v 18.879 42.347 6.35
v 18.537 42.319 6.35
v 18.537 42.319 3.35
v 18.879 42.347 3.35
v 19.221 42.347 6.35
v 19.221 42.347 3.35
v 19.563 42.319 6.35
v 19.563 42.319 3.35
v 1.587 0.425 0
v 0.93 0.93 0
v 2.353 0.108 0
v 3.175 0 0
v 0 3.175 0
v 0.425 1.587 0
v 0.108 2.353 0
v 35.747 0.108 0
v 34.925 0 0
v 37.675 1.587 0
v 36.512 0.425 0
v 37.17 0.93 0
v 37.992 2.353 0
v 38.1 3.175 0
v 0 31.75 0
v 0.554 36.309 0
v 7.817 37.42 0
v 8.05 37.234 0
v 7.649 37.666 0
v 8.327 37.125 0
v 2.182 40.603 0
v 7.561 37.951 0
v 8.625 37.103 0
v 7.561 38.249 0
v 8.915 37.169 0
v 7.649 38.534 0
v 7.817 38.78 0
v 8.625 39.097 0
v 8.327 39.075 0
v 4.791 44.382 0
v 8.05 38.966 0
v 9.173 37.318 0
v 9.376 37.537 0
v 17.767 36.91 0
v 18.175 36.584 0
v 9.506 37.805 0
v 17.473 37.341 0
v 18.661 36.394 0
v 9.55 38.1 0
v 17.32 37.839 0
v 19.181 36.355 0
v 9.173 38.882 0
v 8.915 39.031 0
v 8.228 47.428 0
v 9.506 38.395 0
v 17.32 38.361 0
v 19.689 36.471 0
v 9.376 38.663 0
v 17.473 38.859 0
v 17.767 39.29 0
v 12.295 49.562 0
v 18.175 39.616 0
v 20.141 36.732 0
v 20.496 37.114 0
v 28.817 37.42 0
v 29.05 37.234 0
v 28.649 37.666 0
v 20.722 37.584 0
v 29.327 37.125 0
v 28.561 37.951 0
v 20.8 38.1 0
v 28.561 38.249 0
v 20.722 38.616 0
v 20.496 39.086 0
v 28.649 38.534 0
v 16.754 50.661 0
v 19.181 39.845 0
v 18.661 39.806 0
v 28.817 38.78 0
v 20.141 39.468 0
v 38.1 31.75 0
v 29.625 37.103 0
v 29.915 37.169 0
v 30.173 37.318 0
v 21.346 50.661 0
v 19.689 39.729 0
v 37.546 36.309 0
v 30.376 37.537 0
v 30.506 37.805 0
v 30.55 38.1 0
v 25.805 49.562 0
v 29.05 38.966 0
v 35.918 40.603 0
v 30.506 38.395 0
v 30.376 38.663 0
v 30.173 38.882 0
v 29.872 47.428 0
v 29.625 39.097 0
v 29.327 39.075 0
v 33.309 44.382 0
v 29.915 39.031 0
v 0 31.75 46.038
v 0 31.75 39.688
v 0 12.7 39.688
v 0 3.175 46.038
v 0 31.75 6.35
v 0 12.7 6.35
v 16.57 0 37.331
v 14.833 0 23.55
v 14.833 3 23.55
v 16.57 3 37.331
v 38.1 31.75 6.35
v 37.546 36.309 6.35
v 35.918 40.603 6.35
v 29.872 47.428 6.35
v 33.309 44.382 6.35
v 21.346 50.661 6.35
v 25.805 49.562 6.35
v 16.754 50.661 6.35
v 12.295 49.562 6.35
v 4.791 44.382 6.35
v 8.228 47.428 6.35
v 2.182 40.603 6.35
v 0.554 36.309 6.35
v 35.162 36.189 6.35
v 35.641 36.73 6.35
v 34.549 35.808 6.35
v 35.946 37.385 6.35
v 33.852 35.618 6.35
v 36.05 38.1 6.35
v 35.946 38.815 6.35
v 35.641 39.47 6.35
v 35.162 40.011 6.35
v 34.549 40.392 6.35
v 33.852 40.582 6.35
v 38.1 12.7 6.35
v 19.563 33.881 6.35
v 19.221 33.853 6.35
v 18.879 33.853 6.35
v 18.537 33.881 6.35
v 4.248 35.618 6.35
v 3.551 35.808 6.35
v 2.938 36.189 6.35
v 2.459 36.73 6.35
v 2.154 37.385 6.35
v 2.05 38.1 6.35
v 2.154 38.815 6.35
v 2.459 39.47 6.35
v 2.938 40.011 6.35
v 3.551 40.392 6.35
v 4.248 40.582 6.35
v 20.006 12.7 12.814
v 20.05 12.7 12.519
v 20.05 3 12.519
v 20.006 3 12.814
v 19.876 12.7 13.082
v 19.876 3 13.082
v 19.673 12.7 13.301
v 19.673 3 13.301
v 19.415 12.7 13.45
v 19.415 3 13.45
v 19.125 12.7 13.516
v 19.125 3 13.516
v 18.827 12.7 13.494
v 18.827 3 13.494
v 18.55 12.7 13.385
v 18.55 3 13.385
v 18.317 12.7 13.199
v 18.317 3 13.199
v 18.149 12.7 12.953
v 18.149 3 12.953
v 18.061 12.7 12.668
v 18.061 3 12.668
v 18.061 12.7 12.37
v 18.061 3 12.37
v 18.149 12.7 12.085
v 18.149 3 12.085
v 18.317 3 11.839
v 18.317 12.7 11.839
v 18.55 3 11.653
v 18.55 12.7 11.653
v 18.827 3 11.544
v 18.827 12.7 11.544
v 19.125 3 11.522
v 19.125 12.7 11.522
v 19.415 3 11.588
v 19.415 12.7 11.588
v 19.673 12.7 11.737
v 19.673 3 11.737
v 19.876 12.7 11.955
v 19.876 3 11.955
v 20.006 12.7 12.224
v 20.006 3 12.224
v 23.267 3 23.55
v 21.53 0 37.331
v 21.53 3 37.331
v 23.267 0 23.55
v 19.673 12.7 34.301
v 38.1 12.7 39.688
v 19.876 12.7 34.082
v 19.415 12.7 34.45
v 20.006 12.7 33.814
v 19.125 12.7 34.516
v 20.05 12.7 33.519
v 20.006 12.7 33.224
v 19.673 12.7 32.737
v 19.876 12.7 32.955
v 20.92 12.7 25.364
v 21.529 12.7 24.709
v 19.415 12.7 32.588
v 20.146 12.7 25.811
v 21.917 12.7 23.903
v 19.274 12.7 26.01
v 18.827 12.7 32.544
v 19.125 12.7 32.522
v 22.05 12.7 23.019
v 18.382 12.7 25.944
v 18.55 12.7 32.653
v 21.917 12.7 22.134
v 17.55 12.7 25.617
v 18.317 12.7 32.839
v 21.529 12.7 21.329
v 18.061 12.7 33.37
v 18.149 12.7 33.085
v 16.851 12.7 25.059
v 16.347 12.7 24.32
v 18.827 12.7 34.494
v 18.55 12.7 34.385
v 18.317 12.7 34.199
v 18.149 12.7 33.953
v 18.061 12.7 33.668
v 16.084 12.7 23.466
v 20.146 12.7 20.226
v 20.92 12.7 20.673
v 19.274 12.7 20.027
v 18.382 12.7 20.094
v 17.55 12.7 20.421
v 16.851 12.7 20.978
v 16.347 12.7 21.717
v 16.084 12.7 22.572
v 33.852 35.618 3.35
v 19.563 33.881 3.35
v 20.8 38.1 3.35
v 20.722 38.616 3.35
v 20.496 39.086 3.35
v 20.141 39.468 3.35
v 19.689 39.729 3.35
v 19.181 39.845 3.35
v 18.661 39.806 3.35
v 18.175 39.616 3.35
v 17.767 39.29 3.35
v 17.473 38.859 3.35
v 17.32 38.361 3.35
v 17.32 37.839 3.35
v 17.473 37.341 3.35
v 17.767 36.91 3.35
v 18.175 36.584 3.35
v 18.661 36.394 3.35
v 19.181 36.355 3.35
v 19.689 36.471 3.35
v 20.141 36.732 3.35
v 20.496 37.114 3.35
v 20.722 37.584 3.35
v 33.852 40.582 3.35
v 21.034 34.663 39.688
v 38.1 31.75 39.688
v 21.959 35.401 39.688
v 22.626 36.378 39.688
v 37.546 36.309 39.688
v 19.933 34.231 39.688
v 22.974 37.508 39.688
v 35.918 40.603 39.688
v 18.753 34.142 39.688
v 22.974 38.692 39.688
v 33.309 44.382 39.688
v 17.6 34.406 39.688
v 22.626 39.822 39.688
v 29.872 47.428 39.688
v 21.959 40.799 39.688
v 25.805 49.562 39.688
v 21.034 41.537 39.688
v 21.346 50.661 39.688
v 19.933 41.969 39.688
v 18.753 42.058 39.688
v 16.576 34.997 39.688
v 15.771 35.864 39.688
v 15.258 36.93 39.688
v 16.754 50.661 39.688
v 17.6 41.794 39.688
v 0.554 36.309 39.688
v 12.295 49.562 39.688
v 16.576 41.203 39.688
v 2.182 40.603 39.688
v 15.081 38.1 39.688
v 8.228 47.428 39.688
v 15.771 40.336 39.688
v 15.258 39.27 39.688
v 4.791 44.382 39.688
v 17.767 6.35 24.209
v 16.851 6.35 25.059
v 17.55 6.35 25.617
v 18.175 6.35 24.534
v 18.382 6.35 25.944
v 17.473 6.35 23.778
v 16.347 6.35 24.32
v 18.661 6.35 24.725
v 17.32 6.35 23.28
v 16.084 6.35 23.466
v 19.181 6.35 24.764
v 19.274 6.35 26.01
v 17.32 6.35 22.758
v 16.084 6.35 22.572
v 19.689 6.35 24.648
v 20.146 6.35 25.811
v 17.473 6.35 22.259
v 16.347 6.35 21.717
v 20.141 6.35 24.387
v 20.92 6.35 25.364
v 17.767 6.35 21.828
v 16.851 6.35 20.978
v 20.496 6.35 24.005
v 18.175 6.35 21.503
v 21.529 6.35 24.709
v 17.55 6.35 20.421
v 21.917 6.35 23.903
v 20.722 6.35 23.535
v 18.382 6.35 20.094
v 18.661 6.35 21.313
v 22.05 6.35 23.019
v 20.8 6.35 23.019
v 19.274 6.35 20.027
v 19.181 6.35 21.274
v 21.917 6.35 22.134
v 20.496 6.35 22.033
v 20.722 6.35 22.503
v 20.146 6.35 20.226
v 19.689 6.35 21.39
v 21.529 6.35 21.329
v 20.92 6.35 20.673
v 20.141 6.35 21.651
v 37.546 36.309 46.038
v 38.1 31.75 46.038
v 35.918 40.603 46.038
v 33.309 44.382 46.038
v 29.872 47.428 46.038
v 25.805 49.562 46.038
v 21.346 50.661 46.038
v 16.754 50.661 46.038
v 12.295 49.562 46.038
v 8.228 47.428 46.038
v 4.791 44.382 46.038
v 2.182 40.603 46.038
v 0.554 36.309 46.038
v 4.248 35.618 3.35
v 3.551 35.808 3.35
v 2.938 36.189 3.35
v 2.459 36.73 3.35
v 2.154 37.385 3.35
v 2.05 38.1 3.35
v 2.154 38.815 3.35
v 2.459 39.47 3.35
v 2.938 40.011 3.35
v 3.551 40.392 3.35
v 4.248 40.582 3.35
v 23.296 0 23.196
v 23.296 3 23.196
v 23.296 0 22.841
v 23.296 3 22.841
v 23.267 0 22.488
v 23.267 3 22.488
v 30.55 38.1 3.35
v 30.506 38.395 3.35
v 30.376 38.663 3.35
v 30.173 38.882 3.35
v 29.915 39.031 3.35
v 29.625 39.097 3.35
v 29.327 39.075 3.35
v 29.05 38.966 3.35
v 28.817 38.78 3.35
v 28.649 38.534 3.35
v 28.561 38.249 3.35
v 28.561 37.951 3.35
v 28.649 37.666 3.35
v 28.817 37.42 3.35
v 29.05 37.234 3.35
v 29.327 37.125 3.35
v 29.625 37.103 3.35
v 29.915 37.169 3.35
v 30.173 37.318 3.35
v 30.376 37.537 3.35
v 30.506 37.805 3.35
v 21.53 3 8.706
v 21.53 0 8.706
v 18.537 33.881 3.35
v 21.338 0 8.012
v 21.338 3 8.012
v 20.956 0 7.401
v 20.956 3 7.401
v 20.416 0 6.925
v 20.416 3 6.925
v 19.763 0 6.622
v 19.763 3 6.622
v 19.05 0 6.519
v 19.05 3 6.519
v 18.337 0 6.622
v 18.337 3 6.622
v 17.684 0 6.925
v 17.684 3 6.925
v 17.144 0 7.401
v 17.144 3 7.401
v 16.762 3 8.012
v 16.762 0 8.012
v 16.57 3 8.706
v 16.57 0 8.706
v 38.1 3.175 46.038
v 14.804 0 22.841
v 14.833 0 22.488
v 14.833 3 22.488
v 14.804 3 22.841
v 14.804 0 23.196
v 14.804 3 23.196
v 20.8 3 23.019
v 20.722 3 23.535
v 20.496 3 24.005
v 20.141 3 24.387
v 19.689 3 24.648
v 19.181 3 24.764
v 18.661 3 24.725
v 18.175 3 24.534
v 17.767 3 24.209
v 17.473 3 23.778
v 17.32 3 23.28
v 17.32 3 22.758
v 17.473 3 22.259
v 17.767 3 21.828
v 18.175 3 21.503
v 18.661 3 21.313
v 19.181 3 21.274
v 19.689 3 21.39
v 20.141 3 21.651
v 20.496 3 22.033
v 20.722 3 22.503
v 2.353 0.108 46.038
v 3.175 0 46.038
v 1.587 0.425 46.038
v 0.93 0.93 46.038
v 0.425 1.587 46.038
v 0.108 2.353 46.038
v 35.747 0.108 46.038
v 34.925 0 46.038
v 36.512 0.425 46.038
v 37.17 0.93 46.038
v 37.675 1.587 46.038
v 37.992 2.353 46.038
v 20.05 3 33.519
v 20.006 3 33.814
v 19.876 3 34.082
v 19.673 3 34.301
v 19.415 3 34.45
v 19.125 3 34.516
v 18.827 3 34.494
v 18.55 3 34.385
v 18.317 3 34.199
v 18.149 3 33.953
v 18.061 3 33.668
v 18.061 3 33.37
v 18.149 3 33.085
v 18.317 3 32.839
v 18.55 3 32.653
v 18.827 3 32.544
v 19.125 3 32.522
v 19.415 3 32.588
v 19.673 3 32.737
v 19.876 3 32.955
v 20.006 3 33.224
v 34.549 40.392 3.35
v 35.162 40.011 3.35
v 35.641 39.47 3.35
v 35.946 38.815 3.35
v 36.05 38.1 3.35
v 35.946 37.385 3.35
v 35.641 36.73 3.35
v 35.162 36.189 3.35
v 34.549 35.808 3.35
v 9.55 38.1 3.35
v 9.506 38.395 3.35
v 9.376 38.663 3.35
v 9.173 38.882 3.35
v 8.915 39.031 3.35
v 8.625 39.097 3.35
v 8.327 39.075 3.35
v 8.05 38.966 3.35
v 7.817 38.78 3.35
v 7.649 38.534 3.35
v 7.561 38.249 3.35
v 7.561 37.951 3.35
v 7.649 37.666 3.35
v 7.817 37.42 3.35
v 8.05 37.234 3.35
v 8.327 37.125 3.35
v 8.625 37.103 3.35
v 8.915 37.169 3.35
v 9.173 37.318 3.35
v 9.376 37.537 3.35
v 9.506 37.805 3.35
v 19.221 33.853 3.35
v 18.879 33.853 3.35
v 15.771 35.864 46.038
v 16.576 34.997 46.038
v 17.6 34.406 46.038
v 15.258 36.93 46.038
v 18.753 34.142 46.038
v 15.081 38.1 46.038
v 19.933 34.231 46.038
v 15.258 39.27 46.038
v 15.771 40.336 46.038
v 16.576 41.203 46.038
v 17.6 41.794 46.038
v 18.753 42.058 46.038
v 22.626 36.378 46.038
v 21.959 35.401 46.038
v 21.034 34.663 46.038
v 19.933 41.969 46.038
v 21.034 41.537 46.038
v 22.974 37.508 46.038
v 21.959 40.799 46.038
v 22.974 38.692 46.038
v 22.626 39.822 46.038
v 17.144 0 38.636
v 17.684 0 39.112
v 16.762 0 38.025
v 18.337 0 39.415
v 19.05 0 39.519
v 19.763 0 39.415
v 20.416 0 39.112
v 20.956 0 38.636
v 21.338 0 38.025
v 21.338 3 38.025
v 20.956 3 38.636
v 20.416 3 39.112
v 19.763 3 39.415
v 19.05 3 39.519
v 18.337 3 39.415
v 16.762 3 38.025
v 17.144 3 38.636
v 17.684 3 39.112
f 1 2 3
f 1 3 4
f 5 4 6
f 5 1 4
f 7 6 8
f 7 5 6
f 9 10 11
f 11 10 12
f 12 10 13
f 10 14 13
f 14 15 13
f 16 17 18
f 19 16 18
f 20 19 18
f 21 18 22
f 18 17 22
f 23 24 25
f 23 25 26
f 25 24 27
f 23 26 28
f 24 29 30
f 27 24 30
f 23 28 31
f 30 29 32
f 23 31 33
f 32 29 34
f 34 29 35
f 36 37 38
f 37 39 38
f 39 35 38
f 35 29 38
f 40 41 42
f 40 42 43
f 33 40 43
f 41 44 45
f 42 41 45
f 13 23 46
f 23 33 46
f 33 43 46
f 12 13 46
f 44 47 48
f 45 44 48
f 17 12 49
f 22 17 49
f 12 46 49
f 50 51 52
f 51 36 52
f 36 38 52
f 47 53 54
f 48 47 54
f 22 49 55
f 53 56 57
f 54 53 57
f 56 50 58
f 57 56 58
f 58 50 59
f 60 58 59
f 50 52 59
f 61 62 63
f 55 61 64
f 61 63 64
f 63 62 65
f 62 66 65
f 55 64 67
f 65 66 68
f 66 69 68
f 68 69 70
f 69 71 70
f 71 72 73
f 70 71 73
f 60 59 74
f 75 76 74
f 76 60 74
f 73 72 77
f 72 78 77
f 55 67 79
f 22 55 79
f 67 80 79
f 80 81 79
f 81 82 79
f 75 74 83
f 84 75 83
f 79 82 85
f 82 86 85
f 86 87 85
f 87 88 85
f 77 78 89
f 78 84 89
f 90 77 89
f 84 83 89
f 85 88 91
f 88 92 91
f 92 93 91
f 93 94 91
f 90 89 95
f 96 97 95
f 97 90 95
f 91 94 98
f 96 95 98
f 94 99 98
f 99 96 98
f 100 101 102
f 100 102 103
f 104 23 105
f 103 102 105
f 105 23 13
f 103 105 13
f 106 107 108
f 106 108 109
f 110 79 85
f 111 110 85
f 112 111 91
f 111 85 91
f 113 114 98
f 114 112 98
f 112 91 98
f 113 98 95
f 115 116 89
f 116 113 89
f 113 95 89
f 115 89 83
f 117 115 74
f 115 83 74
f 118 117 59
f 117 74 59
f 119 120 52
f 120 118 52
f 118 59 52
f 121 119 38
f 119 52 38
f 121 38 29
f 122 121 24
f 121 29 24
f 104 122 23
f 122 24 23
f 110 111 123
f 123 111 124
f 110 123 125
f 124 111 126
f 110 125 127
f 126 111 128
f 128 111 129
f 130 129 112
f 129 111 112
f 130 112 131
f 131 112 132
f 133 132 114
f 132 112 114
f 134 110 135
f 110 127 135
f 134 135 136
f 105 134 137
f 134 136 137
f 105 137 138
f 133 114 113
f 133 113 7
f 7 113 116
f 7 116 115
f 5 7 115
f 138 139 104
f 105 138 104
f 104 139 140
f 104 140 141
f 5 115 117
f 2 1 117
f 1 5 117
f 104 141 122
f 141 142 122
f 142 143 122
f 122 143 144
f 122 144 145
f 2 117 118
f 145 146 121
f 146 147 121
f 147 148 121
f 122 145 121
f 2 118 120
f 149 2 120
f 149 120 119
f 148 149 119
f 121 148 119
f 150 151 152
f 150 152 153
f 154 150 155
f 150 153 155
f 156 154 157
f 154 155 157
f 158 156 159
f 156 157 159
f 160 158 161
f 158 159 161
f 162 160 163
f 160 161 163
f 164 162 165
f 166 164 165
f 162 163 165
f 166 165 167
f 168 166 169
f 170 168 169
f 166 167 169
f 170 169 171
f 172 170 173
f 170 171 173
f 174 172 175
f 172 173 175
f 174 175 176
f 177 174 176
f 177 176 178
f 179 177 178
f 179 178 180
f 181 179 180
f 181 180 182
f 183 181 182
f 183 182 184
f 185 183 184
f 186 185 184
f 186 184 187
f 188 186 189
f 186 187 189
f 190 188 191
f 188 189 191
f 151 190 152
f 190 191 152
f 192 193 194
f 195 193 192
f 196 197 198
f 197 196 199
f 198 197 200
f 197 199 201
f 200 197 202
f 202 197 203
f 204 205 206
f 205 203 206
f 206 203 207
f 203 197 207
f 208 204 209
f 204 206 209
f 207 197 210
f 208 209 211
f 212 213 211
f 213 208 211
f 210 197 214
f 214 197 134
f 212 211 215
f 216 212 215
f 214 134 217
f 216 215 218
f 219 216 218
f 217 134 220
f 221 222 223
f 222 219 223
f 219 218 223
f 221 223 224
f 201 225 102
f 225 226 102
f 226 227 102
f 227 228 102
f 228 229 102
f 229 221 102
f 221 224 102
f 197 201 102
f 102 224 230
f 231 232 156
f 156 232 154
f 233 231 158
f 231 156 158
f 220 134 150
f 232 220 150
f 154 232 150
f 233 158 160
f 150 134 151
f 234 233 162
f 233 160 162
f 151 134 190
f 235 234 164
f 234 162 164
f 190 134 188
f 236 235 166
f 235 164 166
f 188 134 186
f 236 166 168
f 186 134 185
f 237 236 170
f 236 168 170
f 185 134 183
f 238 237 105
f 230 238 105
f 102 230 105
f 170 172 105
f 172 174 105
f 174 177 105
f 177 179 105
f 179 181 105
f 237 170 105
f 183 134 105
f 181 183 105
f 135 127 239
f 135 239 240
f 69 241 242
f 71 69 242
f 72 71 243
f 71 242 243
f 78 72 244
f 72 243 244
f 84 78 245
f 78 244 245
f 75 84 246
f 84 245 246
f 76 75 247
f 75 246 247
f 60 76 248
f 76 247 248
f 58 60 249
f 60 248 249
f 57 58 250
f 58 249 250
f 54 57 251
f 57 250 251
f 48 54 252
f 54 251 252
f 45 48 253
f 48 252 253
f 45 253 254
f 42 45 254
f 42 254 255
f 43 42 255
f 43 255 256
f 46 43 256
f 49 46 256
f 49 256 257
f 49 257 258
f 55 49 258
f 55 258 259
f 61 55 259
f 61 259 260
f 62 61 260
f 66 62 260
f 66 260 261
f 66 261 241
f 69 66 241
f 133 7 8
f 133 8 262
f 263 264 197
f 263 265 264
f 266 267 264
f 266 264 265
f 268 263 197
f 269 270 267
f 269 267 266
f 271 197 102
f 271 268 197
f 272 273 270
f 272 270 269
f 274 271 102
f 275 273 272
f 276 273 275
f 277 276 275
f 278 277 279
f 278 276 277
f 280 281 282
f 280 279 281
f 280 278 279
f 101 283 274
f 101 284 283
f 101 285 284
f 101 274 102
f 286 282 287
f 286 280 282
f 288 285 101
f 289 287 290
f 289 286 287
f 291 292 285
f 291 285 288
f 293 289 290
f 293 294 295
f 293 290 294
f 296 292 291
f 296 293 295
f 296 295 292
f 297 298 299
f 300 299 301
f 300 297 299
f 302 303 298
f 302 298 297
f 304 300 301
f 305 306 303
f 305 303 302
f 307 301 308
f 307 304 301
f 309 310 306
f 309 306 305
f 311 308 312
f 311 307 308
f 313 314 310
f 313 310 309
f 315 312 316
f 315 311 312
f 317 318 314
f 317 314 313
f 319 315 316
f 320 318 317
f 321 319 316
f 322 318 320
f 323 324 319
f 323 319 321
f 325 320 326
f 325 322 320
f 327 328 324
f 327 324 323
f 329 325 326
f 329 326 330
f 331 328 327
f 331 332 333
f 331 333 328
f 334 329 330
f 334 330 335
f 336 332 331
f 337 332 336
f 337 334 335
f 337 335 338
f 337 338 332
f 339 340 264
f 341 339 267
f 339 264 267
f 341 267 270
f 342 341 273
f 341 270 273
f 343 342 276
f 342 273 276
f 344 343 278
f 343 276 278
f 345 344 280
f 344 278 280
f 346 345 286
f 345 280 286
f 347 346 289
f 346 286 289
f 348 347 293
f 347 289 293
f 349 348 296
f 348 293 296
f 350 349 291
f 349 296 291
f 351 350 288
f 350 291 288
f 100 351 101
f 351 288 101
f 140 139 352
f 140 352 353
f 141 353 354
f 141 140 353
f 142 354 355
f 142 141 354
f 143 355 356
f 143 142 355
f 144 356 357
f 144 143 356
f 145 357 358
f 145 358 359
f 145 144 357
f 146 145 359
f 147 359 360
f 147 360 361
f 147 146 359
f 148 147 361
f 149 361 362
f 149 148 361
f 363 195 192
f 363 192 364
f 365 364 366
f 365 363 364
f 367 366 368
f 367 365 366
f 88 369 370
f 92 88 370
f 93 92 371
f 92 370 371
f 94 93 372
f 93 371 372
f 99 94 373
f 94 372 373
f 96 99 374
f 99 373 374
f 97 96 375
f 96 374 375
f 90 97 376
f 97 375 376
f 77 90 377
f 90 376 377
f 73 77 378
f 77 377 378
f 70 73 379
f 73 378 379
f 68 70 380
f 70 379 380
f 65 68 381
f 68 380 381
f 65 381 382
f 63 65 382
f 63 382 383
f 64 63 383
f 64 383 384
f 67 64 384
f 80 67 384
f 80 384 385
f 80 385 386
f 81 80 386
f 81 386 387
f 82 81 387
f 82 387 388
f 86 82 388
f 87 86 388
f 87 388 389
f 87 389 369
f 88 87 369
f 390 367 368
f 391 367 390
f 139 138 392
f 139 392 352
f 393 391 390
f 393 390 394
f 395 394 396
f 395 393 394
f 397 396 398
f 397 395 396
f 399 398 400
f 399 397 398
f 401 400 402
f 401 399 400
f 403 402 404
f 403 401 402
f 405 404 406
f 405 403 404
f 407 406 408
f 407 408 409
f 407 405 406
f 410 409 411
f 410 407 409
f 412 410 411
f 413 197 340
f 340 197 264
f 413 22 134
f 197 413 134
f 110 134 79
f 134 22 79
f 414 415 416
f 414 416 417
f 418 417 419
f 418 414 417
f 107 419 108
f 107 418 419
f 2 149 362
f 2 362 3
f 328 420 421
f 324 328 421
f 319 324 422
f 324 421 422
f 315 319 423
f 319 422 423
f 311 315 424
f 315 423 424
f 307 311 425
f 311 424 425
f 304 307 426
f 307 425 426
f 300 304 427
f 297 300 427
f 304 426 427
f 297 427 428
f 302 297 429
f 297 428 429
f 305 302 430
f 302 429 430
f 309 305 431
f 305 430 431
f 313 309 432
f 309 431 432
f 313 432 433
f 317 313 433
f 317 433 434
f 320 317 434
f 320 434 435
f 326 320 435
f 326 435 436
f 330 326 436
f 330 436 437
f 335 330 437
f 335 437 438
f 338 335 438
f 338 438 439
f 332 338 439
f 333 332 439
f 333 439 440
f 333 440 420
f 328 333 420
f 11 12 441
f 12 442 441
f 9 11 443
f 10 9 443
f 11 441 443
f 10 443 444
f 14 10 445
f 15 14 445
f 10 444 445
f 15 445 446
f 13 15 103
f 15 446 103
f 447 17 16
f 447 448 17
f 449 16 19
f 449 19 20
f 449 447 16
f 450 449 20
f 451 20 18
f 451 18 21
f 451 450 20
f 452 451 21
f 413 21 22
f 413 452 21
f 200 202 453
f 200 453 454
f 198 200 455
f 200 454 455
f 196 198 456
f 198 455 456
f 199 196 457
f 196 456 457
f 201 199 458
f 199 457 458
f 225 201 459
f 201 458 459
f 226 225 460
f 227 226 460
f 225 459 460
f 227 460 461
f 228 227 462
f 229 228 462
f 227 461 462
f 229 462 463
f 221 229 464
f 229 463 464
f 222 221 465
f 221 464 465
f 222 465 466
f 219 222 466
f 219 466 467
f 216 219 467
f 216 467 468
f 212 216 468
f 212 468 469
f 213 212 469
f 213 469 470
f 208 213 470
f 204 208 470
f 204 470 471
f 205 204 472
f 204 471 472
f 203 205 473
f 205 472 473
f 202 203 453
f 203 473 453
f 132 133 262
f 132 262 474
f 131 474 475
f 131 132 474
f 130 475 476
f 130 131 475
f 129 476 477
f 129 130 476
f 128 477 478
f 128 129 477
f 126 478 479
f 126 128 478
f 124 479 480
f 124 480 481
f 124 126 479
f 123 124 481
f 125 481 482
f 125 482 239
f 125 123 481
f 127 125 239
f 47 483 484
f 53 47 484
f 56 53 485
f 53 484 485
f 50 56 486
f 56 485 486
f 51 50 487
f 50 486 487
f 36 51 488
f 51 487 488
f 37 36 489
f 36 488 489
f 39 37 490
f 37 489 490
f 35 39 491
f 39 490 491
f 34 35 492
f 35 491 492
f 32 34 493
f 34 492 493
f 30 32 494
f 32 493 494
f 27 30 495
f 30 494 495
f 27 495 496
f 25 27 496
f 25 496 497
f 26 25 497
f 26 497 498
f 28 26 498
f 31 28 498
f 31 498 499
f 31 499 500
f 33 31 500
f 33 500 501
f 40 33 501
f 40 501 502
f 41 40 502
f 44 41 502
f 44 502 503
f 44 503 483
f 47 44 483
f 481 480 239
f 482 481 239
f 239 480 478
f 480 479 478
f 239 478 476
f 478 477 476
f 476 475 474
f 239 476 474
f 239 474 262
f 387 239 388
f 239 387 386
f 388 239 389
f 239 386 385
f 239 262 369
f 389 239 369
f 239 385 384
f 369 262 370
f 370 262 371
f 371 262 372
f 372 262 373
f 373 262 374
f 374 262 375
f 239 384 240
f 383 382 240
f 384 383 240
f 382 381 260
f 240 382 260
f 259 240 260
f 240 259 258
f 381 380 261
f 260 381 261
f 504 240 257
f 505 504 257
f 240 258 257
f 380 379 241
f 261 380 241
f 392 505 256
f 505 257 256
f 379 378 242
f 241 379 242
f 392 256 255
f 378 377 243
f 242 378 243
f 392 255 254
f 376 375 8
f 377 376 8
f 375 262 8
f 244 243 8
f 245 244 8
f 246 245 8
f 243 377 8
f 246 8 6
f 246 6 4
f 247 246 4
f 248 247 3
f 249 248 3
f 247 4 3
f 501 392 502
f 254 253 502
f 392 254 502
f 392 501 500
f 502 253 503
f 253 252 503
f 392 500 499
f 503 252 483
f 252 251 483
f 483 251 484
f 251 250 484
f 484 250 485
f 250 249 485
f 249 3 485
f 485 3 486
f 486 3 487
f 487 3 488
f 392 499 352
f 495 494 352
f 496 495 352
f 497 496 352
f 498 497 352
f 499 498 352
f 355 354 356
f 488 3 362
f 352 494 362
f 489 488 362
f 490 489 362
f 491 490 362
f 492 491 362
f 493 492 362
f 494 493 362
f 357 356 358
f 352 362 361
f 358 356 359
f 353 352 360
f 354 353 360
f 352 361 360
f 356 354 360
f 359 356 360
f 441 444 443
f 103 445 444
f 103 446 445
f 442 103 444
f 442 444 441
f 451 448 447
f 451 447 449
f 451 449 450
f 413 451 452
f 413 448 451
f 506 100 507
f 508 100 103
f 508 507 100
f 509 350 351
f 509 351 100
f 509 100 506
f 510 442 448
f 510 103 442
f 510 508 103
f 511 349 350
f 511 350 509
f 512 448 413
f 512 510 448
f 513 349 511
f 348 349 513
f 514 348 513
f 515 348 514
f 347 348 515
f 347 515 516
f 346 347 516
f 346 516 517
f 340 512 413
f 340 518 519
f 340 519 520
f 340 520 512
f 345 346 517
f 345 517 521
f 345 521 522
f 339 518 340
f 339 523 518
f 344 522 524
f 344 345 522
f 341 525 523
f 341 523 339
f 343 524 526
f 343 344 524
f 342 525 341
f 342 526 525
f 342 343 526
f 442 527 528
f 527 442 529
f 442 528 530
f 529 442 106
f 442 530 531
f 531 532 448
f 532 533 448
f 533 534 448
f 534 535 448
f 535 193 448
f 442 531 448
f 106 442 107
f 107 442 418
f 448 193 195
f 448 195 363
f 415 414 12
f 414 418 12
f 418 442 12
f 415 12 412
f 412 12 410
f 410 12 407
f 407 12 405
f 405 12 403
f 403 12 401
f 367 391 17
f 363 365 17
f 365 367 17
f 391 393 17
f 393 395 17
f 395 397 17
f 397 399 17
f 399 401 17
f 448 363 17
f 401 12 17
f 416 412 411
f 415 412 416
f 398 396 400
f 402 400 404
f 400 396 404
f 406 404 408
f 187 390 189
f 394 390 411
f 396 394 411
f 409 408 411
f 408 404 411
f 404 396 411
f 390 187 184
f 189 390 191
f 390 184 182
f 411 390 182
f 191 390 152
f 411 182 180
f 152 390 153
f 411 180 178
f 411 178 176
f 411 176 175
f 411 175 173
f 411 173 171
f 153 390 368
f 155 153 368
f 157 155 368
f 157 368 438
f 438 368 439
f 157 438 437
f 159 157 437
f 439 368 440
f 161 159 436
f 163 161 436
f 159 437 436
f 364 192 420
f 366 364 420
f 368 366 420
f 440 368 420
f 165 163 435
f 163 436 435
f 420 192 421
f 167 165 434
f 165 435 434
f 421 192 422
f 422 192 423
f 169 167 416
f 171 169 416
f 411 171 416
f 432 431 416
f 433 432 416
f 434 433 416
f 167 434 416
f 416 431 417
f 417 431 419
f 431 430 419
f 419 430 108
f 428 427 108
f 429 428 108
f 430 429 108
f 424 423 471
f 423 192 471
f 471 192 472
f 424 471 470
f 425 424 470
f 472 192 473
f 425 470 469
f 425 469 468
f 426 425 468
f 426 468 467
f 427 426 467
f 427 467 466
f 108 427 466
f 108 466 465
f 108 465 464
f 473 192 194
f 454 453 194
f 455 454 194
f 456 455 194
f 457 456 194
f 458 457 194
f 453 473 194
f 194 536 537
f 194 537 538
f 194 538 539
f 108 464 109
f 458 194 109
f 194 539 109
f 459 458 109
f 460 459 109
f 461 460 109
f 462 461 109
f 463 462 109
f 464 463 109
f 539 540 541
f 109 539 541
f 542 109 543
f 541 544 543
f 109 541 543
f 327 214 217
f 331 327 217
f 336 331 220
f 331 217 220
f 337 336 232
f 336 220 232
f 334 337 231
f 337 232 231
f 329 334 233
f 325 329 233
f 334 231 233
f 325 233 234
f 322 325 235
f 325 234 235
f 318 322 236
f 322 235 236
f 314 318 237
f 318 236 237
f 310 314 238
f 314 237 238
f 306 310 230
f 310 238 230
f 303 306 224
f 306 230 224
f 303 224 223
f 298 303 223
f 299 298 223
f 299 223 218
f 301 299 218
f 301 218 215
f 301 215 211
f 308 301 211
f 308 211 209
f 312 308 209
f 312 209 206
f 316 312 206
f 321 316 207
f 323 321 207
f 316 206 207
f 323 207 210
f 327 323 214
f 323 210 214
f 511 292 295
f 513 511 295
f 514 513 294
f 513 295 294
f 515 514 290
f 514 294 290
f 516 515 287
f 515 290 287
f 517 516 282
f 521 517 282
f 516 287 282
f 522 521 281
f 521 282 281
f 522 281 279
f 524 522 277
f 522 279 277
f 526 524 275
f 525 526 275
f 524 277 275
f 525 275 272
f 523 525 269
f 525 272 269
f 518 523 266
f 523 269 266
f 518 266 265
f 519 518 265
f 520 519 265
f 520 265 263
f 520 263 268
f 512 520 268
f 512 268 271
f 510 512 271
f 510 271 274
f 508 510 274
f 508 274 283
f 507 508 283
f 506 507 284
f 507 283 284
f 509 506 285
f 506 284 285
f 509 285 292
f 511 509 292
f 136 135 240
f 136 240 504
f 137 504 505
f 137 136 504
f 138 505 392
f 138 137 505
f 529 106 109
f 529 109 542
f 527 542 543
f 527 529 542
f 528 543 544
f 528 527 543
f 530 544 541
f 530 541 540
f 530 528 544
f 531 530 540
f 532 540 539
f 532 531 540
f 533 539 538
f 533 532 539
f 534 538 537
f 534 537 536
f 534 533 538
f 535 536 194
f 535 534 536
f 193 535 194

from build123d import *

# Parameters (mm, degrees)
BOSS_EXTRUDE1_DEPTH = 46.0375
FILLET1_R           = 3.175
CUT_EXTRUDE1_DEPTH  = 16.66875
SKETCH3_R           = 0.999998
SKETCH3_R_2         = 1.75
CUT_EXTRUDE2_DEPTH  = 6.35
SKETCH4_R           = 3.96875
CUT_EXTRUDE3_DEPTH  = 6.35
CUT_EXTRUDE4_DEPTH  = 3
SKETCH6_R           = 1.75
SKETCH6_R_2         = 1
CUT_EXTRUDE5_DEPTH  = 9.7
SKETCH7_R           = 3
CUT_EXTRUDE6_DEPTH  = 6.35
SKETCH9_R           = 0.999998
SKETCH9_R_2         = 1.75
CUT_EXTRUDE7_DEPTH  = 3


with BuildPart() as part:
    # Sketch1 → Boss-Extrude1 (new body)
    with BuildSketch(Plane.XY):
        with BuildLine():
            Line((0, 0), (38.1, 0))
            Line((38.1, 0), (38.1, 31.75))
            ThreePointArc((38.1, 31.75), (19.05, 50.8), (0, 31.75))
            Line((0, 31.75), (0, 0))
        make_face()
    extrude(amount=BOSS_EXTRUDE1_DEPTH)

    # Fillet1
    fillet1_edges = [part.edges().sort_by_distance(p)[0] for p in [
        (38.1, 0, 23.01875),
        (0, 0, 23.01875),
    ]]
    fillet(fillet1_edges, radius=FILLET1_R)

    # Sketch2 → Cut-Extrude1 (cut, symmetric)
    with BuildSketch(Plane(origin=(0, 0, 23.01875), x_dir=(-1, 0, 0), z_dir=(0, 0, -1))):
        with BuildLine():
            Line((-38.1, 31.75), (-38.1, 12.7))
            Line((-38.1, 12.7), (0, 12.7))
            Line((0, 12.7), (0, 31.75))
            ThreePointArc((0, 31.75), (-19.05, 50.8), (-38.1, 31.75))
        make_face()
    extrude(amount=CUT_EXTRUDE1_DEPTH, both=True, mode=Mode.SUBTRACT)

    # Sketch3 → Cut-Extrude2 (cut)
    with BuildSketch(Plane.XY.offset(6.35)):
        with Locations((8.55, 38.1)):
            Circle(SKETCH3_R)
        with Locations((29.55, 38.1)):
            Circle(SKETCH3_R)
        with Locations((19.05, 38.1)):
            Circle(SKETCH3_R_2)
    extrude(amount=-CUT_EXTRUDE2_DEPTH, mode=Mode.SUBTRACT)

    # Sketch4 → Cut-Extrude3 (cut)
    with BuildSketch(Plane(origin=(0, 0, 39.6875), x_dir=(-1, 0, 0), z_dir=(0, 0, -1))):
        with Locations((-19.05, 38.1)):
            Circle(SKETCH4_R)
    extrude(amount=-CUT_EXTRUDE3_DEPTH, mode=Mode.SUBTRACT)

    # Sketch5 → Cut-Extrude4 (cut)
    with BuildSketch(Plane.XZ):
        with BuildLine():
            Line((23.266666152, 22.4875), (21.530391854, 8.70625))
            ThreePointArc((21.530391854, 8.70625), (19.05, 6.51875), (16.569608146, 8.70625))
            Line((16.569608146, 8.70625), (14.833333848, 22.4875))
            ThreePointArc((14.833333848, 22.4875), (14.8, 23.01875), (14.833333848, 23.55))
            Line((14.833333848, 23.55), (16.569608146, 37.33125))
            ThreePointArc((16.569608146, 37.33125), (19.05, 39.51875), (21.530391854, 37.33125))
            Line((21.530391854, 37.33125), (23.266666152, 23.55))
            ThreePointArc((23.266666152, 23.55), (23.3, 23.01875), (23.266666152, 22.4875))
        make_face()
    extrude(amount=-CUT_EXTRUDE4_DEPTH, mode=Mode.SUBTRACT)

    # Sketch6 → Cut-Extrude5 (cut)
    with BuildSketch(Plane.XZ.offset(-3)):
        with Locations((19.05, 23.01875)):
            Circle(SKETCH6_R)
        with Locations((19.05, 33.51875)):
            Circle(SKETCH6_R_2)
        with Locations((19.05, 12.51875)):
            Circle(SKETCH6_R_2)
    extrude(amount=-CUT_EXTRUDE5_DEPTH, mode=Mode.SUBTRACT)

    # Sketch7 → Cut-Extrude6 (cut)
    with BuildSketch(Plane(origin=(0, 12.7, 0), x_dir=(1, 0, 0), z_dir=(0, 1, 0))):
        with Locations((19.05, -23.01875)):
            Circle(SKETCH7_R)
    extrude(amount=-CUT_EXTRUDE6_DEPTH, mode=Mode.SUBTRACT)

    # Sketch9 → Cut-Extrude7 (cut)
    with BuildSketch(Plane.XY.offset(6.35)):
        with BuildLine():
            Line((4.248275862, 40.581725719), (18.537068966, 42.318933722))
            ThreePointArc((18.537068966, 42.318933722), (19.05, 42.35), (19.562931034, 42.318933722))
            Line((19.562931034, 42.318933722), (33.851724138, 40.581725719))
            ThreePointArc((33.851724138, 40.581725719), (36.05, 38.1), (33.851724138, 35.618274281))
            Line((33.851724138, 35.618274281), (19.562931034, 33.881066278))
            ThreePointArc((19.562931034, 33.881066278), (19.05, 33.85), (18.537068966, 33.881066278))
            Line((18.537068966, 33.881066278), (4.248275862, 35.618274281))
            ThreePointArc((4.248275862, 35.618274281), (2.05, 38.1), (4.248275862, 40.581725719))
        make_face()
        with Locations((8.55, 38.1)):
            Circle(SKETCH9_R, mode=Mode.SUBTRACT)
        with Locations((29.55, 38.1)):
            Circle(SKETCH9_R, mode=Mode.SUBTRACT)
        with Locations((19.05, 38.1)):
            Circle(SKETCH9_R_2, mode=Mode.SUBTRACT)
    extrude(amount=-CUT_EXTRUDE7_DEPTH, mode=Mode.SUBTRACT)


solid = part.part
